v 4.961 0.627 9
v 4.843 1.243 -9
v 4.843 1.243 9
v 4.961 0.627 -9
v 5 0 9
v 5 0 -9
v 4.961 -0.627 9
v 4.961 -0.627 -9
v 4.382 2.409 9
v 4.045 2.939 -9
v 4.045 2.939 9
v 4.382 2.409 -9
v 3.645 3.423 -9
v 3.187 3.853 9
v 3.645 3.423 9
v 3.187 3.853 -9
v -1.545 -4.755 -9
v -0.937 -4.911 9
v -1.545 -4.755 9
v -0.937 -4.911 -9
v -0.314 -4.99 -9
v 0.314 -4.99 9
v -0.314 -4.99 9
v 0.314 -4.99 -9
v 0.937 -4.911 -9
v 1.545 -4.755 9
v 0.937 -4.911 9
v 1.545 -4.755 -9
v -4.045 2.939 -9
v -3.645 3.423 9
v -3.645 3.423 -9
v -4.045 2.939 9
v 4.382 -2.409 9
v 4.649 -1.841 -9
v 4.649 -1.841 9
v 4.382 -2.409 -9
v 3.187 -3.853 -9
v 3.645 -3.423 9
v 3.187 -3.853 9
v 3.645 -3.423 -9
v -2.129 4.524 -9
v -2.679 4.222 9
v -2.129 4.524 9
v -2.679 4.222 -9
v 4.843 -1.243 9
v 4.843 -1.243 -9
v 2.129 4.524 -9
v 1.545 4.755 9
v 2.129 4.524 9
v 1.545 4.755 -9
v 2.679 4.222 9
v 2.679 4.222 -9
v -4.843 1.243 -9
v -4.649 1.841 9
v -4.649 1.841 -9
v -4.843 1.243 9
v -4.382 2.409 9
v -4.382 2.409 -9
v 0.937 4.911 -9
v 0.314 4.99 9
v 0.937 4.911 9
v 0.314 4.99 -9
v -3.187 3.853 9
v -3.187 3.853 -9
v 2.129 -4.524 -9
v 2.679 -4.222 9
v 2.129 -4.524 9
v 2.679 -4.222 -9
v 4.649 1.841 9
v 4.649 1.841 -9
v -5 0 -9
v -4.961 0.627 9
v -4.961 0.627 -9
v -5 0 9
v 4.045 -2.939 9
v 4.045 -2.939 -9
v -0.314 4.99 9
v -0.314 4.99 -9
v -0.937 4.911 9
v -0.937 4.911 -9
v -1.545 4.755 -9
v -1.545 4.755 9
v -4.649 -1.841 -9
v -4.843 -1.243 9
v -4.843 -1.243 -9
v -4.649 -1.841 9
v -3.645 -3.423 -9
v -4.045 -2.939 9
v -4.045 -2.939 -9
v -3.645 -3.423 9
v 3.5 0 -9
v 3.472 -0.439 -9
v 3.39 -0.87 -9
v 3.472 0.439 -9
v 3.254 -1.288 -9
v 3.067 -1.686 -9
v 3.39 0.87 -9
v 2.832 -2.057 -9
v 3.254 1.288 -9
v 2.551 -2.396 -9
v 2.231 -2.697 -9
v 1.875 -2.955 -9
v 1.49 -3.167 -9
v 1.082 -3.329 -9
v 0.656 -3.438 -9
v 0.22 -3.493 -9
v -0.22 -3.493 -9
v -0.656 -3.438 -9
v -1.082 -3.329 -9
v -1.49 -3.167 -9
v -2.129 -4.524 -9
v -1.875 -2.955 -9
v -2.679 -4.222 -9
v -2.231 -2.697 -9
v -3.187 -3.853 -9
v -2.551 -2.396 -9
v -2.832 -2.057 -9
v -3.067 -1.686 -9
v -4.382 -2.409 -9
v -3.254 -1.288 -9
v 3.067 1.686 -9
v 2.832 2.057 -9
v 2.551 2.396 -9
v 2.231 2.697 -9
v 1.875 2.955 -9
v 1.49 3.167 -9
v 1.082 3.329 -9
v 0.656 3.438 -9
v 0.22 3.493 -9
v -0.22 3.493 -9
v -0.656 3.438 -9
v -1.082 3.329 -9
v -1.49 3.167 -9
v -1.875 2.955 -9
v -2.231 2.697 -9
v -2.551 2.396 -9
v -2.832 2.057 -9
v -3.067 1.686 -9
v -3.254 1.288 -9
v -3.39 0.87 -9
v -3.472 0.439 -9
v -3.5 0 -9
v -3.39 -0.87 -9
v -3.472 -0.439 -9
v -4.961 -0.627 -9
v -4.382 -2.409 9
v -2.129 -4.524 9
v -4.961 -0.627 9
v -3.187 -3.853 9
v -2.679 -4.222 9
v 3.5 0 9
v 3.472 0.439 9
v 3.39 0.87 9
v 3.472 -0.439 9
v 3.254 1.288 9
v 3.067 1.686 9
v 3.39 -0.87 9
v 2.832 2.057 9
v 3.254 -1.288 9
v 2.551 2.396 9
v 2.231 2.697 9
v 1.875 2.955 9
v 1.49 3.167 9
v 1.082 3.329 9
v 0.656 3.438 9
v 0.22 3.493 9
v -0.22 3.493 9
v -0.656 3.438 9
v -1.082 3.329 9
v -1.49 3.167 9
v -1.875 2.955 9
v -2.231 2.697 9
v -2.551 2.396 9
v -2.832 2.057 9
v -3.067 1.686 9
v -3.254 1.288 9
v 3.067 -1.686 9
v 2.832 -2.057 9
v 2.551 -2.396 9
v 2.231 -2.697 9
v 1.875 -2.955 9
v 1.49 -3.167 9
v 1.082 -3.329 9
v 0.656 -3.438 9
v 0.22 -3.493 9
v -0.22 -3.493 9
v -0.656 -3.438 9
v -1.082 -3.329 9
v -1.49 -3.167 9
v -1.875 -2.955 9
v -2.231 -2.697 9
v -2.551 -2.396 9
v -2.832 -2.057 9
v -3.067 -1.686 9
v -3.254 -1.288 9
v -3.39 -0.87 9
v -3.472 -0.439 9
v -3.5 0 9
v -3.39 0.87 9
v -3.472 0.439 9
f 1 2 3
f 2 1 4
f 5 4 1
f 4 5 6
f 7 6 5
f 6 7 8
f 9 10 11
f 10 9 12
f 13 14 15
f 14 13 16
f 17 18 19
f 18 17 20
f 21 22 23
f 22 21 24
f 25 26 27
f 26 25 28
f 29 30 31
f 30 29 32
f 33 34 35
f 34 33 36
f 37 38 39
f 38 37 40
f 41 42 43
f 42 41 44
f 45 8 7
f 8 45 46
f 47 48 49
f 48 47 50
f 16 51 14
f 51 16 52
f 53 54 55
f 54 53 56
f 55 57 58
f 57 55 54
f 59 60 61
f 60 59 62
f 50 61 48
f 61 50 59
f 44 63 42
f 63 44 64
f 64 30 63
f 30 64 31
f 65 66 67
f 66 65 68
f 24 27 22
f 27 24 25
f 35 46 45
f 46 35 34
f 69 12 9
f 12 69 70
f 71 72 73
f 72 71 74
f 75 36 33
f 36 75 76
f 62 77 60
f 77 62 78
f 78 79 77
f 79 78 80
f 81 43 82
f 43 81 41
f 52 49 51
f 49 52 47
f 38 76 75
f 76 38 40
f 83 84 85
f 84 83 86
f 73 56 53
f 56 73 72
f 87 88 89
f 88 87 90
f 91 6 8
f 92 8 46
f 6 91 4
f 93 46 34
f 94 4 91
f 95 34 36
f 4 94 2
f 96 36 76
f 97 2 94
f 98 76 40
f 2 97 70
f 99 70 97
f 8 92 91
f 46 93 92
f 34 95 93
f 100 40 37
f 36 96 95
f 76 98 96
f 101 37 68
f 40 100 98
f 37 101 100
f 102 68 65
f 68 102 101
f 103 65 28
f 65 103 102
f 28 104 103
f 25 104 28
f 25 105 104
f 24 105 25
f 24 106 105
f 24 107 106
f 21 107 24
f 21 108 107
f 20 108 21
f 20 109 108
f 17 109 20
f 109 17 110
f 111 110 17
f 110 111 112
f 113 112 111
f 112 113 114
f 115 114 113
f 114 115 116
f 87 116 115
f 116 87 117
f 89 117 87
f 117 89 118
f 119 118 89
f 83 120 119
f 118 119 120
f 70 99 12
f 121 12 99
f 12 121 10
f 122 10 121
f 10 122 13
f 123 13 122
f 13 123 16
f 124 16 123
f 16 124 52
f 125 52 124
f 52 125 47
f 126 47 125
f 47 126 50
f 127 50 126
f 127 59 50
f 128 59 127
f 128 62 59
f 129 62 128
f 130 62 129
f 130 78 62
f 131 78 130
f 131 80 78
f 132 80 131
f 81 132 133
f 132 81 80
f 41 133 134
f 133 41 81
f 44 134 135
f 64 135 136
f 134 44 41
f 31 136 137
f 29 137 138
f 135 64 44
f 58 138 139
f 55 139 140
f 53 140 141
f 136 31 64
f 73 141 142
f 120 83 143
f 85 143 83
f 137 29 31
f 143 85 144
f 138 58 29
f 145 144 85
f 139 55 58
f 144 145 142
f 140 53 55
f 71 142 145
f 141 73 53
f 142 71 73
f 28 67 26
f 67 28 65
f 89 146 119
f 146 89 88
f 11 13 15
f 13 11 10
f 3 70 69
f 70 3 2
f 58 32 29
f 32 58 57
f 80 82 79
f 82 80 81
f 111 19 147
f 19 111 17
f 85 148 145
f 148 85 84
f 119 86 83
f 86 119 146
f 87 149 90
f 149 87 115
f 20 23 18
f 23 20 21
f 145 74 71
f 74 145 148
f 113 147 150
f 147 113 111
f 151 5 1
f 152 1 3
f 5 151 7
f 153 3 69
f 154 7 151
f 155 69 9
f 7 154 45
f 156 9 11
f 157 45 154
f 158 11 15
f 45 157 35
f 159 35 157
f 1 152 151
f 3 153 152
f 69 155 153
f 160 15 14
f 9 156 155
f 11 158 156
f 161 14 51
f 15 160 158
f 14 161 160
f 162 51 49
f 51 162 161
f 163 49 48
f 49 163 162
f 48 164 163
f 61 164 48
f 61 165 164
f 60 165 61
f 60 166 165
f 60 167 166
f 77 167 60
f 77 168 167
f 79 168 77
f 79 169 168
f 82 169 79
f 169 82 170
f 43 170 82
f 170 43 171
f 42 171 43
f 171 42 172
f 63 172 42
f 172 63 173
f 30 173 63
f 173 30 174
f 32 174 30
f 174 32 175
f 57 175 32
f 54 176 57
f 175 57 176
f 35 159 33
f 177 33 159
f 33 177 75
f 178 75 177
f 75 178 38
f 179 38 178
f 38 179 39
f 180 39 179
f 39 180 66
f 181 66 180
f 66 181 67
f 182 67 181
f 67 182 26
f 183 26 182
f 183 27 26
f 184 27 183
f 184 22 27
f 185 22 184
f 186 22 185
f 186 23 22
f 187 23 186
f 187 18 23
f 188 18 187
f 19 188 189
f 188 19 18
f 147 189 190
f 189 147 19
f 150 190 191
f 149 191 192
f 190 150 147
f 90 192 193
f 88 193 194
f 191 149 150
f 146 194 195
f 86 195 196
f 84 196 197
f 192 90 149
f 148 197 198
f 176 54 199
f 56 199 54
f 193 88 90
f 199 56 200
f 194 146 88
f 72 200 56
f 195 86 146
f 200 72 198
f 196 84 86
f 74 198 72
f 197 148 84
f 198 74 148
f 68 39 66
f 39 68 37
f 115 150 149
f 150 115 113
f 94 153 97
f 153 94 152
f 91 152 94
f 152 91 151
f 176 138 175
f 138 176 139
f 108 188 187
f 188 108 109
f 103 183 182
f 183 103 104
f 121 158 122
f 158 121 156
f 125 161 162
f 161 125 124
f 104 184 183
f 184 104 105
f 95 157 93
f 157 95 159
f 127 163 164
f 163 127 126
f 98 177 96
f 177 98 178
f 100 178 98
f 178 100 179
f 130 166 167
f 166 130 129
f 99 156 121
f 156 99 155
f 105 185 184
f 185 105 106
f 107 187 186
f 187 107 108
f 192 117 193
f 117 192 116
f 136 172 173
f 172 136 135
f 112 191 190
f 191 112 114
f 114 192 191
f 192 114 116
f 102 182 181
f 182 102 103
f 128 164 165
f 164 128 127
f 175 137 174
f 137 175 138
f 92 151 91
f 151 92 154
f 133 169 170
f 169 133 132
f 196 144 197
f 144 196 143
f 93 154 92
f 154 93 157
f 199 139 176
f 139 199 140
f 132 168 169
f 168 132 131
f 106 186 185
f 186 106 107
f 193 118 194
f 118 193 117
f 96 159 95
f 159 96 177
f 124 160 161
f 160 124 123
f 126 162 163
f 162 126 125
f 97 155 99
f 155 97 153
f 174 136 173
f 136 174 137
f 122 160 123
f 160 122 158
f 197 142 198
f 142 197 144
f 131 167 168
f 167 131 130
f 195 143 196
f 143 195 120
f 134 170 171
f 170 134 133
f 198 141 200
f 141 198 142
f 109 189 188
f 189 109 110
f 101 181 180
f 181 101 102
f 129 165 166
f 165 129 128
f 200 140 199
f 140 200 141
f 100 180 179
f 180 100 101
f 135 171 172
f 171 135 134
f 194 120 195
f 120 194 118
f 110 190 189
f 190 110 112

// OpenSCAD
$fn = 50;


difference() {
	union() {
		translate(v = [0, 0, -9.0000000000]) {
			cylinder(h = 18, r = 5.0000000000);
		}
	}
	union() {
		translate(v = [0, 0, -100.0000000000]) {
			cylinder(h = 200, r = 3.5000000000);
		}
	}
}
